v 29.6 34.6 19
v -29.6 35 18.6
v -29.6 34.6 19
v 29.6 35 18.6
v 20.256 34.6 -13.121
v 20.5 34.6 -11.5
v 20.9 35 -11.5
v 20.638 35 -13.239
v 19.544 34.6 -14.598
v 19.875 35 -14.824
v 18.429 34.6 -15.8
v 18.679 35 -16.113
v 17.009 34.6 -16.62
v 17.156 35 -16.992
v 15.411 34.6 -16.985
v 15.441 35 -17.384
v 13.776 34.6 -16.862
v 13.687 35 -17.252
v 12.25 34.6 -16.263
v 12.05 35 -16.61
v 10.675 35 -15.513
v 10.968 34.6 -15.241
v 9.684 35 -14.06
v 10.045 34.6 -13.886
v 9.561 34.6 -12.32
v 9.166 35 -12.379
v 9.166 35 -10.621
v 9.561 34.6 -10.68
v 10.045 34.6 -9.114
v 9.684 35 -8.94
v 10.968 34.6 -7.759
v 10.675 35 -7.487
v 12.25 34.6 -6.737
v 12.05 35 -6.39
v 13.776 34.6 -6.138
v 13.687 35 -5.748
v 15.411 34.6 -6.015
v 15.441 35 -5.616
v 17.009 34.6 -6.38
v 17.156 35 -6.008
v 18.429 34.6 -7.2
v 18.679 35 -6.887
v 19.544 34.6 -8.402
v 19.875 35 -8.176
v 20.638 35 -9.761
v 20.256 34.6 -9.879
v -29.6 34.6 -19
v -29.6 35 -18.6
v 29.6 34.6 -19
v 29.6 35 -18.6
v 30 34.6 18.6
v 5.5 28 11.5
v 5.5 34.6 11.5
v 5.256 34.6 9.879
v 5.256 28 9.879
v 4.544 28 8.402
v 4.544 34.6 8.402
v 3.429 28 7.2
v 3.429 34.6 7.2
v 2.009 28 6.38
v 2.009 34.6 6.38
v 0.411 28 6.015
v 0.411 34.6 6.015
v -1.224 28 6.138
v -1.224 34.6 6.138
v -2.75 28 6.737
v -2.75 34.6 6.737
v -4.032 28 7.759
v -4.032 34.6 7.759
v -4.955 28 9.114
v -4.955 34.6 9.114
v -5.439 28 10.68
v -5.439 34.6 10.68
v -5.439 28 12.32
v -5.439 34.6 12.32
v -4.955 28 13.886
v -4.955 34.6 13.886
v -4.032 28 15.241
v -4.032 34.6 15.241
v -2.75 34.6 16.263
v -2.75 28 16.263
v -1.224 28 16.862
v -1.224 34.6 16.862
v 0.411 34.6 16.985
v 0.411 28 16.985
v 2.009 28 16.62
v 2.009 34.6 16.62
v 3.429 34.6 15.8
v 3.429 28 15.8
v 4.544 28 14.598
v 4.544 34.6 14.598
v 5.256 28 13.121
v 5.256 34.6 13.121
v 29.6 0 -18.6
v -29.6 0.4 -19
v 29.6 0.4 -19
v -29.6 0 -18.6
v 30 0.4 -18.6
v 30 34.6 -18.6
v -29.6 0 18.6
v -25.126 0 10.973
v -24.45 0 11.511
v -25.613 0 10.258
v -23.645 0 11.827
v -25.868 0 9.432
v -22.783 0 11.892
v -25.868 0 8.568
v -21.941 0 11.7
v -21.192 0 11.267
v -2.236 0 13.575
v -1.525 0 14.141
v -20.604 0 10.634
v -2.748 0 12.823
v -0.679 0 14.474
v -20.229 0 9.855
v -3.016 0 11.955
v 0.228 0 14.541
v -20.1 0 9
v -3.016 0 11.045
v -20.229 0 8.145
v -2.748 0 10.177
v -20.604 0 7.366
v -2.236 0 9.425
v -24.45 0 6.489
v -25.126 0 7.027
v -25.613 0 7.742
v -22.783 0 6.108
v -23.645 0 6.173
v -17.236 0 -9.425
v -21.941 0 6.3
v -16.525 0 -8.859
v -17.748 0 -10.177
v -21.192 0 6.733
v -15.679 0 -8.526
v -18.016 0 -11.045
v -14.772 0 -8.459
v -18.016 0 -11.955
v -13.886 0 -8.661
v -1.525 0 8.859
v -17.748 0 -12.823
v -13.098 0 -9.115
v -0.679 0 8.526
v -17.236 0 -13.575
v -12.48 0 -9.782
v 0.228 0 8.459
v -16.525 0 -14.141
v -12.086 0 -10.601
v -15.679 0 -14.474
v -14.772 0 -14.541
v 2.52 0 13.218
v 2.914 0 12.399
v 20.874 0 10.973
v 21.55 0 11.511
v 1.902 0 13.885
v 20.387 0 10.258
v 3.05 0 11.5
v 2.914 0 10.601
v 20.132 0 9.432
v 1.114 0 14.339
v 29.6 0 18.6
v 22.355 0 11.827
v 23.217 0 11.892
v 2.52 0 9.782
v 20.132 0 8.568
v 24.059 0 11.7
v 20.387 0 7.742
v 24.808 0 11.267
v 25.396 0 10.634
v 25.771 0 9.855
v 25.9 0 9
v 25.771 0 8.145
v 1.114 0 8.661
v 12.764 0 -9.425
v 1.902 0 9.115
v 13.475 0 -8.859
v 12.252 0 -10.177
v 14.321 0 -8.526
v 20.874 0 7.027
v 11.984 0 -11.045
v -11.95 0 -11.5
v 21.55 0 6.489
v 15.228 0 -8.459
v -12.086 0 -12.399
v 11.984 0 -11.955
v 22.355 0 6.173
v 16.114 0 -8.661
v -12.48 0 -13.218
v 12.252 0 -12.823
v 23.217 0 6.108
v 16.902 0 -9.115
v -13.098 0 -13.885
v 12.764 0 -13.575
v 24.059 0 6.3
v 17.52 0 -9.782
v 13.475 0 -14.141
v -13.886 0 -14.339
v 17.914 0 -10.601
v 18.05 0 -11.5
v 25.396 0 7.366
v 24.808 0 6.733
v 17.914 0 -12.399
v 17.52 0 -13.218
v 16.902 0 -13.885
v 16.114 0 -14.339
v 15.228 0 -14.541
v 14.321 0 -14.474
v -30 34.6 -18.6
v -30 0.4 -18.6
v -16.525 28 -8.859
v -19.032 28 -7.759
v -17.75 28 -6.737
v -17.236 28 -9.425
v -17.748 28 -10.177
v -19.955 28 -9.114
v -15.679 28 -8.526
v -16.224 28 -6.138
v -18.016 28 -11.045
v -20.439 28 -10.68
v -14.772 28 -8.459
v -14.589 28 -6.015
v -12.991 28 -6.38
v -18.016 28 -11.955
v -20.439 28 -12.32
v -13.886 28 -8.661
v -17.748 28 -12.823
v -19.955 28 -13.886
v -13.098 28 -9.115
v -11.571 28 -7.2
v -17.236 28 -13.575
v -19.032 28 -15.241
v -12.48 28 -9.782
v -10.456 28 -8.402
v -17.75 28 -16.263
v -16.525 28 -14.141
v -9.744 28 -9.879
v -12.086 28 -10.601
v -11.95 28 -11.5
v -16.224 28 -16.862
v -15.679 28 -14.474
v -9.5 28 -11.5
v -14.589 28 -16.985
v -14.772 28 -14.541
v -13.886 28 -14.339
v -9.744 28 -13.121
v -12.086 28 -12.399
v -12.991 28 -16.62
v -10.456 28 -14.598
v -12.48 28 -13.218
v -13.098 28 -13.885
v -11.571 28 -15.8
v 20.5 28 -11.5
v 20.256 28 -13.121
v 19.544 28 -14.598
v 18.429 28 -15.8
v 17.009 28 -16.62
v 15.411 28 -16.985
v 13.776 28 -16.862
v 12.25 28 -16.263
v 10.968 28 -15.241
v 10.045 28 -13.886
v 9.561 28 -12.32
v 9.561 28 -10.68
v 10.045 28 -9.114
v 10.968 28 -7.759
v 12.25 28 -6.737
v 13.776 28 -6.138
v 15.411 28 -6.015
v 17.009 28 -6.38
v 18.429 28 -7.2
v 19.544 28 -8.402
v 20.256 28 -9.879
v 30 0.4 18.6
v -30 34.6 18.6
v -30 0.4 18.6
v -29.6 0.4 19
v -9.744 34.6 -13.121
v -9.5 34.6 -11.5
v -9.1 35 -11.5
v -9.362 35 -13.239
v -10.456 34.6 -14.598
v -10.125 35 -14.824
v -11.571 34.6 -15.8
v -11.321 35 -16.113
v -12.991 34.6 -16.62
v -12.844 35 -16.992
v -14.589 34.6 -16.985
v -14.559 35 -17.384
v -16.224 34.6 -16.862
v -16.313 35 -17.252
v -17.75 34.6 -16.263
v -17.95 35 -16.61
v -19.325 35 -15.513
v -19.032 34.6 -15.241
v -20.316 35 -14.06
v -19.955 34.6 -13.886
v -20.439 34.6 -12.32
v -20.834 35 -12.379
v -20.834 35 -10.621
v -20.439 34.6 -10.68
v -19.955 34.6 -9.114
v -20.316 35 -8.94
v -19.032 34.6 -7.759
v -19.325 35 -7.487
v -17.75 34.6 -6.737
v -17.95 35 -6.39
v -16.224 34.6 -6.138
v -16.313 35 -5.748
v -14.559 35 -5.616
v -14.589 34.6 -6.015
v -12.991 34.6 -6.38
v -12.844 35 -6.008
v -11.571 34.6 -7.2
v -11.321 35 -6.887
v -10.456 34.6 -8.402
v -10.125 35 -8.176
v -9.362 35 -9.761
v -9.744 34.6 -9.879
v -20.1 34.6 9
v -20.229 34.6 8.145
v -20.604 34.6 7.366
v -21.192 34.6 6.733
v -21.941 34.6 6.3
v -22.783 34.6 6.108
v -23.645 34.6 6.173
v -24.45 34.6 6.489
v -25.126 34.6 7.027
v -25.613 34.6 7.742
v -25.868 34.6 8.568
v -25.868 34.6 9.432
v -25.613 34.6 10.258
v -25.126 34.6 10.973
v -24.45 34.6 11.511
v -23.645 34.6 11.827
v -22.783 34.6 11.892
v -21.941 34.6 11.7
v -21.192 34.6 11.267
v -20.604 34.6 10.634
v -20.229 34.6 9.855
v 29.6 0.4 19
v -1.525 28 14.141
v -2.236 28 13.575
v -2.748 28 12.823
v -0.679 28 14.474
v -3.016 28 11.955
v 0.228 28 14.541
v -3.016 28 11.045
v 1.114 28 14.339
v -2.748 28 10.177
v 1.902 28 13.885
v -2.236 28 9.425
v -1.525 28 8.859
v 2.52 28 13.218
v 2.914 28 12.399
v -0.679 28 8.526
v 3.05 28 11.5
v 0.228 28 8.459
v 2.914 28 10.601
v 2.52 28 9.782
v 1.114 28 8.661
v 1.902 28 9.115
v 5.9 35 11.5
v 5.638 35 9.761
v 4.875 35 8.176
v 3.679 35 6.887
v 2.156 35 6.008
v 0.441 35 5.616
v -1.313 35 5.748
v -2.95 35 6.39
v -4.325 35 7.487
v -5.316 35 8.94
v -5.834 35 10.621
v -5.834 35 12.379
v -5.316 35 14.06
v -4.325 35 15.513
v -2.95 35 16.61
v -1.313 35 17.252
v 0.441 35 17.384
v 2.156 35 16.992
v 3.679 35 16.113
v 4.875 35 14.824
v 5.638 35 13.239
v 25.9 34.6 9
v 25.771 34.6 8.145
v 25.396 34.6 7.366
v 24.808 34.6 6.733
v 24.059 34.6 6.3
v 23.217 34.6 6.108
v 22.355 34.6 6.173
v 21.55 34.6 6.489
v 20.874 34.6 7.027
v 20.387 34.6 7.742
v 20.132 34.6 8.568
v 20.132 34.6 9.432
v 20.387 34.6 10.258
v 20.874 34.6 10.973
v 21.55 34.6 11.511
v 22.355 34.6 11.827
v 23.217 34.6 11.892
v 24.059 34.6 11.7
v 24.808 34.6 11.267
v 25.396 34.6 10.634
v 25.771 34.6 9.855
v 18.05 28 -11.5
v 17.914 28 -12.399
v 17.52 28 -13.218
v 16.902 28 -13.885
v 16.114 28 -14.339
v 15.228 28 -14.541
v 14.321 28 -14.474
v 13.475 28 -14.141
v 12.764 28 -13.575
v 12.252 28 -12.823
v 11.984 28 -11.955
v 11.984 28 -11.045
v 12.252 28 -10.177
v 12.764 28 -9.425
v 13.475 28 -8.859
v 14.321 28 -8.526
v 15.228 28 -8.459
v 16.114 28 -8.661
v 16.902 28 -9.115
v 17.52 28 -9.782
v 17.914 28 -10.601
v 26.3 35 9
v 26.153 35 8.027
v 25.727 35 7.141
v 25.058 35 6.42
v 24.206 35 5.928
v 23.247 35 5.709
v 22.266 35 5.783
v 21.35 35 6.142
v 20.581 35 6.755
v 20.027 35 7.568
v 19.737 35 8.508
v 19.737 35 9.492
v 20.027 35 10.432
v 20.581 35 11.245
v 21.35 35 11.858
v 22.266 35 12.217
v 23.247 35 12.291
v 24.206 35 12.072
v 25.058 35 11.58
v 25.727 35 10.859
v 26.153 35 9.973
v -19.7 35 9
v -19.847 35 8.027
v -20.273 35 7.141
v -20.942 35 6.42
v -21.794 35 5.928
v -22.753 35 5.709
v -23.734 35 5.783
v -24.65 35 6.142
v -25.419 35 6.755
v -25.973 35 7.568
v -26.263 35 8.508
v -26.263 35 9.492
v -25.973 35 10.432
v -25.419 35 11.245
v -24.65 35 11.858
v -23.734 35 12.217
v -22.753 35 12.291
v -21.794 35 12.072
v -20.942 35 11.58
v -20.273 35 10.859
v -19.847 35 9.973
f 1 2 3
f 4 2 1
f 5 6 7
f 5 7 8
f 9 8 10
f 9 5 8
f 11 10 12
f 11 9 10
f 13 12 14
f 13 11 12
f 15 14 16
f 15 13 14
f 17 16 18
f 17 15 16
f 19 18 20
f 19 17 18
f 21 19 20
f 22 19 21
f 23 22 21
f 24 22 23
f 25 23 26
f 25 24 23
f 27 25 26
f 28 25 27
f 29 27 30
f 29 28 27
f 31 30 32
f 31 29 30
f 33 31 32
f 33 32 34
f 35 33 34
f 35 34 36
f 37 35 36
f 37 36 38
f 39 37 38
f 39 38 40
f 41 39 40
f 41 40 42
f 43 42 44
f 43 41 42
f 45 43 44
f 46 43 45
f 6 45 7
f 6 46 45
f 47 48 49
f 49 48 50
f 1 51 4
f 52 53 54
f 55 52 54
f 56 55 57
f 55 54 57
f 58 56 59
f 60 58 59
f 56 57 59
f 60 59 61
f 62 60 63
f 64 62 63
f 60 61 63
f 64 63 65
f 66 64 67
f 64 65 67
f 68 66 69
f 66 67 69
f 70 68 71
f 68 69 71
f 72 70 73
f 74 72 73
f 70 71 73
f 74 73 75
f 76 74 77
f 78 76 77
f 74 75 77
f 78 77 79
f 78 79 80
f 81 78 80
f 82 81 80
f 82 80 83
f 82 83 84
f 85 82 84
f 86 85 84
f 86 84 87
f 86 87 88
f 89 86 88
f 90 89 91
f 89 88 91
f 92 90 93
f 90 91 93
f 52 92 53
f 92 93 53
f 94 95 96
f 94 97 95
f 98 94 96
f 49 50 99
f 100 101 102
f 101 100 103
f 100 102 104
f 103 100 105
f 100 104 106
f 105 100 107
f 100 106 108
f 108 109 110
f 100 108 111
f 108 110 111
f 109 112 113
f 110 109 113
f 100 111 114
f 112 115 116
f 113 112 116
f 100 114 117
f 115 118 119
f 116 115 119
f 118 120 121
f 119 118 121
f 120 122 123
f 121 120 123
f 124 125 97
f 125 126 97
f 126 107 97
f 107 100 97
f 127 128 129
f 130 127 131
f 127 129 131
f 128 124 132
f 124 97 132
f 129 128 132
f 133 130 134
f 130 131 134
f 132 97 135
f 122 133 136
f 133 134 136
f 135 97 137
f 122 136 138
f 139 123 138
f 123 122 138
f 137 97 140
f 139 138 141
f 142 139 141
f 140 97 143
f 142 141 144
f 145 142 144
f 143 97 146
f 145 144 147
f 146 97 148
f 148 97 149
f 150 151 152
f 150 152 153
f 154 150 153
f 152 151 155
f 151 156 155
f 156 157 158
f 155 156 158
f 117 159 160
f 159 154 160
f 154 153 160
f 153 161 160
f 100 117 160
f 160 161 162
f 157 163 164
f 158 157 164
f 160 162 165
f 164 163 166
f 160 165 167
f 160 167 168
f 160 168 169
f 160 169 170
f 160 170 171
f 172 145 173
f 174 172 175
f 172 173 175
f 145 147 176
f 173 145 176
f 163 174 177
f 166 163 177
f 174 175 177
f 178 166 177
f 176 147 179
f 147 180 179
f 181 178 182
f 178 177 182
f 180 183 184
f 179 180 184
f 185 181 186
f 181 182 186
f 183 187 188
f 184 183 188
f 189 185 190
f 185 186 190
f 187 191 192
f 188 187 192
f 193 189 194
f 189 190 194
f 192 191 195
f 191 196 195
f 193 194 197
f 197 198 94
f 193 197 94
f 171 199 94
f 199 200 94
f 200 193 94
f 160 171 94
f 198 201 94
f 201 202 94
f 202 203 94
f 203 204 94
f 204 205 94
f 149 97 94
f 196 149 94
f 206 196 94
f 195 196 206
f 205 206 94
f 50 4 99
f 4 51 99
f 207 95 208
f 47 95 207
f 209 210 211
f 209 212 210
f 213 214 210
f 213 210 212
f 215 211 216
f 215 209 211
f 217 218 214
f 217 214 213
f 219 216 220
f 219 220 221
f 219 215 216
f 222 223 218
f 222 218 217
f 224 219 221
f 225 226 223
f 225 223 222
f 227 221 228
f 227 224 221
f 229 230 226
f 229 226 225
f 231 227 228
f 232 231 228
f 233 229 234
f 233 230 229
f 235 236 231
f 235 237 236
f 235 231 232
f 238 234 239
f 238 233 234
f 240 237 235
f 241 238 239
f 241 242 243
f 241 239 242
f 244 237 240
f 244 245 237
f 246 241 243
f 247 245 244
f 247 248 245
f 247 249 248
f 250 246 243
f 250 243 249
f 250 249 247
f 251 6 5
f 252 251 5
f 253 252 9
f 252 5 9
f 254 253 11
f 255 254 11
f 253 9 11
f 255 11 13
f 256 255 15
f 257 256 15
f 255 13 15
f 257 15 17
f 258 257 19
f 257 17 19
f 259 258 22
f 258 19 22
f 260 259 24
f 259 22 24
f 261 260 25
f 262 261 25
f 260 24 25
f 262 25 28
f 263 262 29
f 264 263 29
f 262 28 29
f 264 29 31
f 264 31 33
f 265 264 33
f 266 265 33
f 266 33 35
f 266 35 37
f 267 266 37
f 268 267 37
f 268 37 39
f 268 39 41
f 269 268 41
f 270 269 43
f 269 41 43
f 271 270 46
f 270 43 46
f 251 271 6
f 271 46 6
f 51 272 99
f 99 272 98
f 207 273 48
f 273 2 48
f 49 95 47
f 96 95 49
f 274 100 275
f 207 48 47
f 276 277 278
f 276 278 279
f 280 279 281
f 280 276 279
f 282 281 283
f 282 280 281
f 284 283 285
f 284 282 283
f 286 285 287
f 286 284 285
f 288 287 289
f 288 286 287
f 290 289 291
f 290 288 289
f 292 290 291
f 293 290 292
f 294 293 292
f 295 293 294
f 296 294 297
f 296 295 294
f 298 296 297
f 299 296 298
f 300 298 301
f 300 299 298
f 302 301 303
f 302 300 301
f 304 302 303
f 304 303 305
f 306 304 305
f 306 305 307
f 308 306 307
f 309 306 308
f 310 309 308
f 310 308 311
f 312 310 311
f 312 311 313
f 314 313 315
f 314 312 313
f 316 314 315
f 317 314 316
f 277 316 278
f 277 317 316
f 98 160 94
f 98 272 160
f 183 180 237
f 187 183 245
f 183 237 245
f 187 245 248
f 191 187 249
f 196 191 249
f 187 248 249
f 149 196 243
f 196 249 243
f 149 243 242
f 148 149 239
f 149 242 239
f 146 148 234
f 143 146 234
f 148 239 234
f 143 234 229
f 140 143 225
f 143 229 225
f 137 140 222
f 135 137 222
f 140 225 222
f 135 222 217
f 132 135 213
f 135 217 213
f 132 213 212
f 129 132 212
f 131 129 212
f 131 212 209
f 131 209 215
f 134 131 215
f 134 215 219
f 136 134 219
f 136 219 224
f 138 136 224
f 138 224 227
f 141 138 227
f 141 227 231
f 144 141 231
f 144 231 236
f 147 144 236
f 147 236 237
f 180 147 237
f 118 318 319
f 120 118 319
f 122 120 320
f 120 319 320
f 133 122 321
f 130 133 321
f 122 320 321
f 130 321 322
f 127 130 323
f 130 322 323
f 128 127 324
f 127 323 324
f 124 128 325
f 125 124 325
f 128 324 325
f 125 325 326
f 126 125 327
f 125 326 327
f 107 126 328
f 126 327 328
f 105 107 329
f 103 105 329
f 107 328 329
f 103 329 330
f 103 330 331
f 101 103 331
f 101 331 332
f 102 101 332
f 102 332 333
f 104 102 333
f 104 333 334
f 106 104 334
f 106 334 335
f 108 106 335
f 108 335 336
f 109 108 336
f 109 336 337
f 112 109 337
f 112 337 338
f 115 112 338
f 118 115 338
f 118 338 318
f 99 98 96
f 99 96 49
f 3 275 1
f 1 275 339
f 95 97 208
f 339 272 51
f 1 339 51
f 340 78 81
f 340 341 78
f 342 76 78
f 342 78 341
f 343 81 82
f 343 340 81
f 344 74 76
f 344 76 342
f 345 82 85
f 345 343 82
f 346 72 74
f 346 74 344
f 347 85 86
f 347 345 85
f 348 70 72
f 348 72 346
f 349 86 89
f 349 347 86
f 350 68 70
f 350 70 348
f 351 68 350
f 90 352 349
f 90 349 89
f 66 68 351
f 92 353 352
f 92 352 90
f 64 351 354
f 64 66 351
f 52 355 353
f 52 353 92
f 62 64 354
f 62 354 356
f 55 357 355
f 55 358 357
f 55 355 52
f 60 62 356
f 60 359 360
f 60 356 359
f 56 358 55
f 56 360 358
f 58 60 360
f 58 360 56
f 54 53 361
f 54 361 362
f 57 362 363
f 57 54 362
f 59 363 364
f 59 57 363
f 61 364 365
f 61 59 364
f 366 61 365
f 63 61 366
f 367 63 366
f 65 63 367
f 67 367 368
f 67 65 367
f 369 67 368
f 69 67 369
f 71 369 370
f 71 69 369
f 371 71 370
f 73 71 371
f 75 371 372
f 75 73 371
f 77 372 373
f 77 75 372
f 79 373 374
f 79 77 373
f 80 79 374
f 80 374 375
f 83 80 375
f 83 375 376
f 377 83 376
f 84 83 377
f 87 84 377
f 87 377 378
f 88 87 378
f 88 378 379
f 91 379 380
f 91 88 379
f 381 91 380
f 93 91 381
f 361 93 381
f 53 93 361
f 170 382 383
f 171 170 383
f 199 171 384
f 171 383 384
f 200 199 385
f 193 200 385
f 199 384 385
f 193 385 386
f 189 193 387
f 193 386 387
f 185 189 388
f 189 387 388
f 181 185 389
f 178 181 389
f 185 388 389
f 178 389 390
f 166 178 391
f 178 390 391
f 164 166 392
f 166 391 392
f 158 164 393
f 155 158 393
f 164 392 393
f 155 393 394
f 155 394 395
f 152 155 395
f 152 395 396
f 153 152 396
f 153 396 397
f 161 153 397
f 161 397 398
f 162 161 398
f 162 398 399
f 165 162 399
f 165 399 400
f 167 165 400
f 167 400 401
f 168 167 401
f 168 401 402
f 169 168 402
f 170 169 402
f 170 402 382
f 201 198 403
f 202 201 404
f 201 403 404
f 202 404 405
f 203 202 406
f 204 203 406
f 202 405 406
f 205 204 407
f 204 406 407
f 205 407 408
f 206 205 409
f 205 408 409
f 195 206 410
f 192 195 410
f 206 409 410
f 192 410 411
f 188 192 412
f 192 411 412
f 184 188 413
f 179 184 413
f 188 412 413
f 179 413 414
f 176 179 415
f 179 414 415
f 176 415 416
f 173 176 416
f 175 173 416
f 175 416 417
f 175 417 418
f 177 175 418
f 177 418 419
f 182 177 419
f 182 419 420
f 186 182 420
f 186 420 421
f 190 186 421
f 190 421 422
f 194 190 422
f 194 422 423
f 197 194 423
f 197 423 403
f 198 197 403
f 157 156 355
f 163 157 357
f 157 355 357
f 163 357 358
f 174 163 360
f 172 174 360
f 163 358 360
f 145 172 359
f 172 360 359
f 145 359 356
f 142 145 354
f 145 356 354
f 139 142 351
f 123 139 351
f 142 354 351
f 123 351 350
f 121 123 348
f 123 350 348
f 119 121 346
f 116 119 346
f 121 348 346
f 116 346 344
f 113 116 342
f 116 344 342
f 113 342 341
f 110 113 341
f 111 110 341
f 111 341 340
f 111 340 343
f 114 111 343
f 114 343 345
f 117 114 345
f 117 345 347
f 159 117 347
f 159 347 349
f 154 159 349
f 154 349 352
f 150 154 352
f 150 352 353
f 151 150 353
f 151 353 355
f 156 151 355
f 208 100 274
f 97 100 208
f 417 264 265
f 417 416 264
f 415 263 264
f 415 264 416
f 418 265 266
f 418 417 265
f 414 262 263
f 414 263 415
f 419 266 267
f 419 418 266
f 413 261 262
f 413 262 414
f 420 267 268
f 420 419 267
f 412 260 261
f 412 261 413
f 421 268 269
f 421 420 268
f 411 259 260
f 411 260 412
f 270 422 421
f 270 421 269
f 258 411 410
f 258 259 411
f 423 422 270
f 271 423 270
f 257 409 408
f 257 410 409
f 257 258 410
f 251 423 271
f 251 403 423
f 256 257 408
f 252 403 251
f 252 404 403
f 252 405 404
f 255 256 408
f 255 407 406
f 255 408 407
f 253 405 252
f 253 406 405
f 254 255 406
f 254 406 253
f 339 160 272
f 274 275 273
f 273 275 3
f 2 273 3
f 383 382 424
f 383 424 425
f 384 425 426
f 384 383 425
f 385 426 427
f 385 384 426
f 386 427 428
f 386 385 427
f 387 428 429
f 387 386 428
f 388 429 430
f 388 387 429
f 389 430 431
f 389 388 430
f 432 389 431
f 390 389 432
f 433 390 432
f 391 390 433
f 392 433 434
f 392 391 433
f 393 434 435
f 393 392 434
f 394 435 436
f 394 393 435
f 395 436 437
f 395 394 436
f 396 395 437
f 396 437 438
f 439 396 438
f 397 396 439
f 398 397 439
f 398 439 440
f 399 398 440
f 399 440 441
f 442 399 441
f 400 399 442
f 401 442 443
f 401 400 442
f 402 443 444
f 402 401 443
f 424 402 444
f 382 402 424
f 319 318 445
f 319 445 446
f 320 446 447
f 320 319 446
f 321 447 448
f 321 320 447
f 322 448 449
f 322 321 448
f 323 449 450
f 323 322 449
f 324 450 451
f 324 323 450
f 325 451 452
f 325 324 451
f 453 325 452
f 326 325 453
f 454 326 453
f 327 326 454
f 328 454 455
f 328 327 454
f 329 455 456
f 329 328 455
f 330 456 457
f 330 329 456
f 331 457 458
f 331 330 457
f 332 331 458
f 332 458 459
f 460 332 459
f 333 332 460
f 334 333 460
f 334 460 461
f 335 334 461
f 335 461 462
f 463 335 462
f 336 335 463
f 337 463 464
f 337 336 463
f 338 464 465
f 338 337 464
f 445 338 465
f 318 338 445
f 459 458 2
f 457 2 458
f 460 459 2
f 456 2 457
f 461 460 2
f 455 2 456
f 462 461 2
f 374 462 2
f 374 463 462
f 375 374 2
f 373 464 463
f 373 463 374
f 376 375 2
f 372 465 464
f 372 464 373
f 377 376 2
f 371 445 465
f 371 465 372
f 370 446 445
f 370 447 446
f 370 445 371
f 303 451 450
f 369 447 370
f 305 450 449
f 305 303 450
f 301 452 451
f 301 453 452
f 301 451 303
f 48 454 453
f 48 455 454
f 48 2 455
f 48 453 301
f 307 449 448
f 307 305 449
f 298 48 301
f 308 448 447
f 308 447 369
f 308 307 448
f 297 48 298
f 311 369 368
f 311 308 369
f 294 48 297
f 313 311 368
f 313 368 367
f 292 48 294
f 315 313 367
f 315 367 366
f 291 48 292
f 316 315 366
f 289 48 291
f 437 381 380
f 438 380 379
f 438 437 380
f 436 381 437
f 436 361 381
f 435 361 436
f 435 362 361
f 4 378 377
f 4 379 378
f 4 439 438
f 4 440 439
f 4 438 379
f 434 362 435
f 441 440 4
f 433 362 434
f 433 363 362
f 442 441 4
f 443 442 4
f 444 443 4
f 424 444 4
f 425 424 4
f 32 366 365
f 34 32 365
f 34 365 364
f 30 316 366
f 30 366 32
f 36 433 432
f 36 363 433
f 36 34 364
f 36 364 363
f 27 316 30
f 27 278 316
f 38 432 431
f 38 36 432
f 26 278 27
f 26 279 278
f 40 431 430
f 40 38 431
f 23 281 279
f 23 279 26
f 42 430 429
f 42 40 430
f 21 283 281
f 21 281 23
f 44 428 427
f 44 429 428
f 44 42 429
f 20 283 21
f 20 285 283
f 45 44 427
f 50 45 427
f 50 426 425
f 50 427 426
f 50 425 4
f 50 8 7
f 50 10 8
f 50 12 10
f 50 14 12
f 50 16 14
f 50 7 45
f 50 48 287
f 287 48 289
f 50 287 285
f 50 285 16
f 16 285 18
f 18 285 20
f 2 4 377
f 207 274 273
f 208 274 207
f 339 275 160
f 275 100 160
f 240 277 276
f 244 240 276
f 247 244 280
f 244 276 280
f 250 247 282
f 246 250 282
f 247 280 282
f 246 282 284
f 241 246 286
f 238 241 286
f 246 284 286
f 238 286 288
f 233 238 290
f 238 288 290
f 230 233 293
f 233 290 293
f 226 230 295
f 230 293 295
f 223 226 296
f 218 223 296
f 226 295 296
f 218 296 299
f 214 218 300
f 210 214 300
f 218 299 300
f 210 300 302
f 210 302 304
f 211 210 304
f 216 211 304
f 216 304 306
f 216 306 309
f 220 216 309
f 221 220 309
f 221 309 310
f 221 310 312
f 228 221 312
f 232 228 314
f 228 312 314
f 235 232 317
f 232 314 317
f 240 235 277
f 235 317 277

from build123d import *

# Parameters (mm, degrees)
SKETCH1_W           = 60
SKETCH1_H           = 38
BOSS_EXTRUDE1_DEPTH = 35
SKETCH2_R           = 2.9
SKETCH2_R_2         = 3.05
CUT_EXTRUDE1_DEPTH  = 36
SKETCH3_R           = 5.5
CUT_EXTRUDE2_DEPTH  = 7
CHAMFER1_SIZE       = 0.4


with BuildPart() as part:
    # Sketch1 → Boss-Extrude1 (new body)
    with BuildSketch(Plane(origin=(0, 0, 0), x_dir=(1, 0, 0), z_dir=(0, 1, 0))):
        Rectangle(SKETCH1_W, SKETCH1_H)
    extrude(amount=BOSS_EXTRUDE1_DEPTH)

    # Sketch2 → Cut-Extrude1 (cut, through all)
    with BuildSketch(Plane(origin=(0, 35, 0), x_dir=(1, 0, 0), z_dir=(0, 1, 0))):
        with Locations((-23, -9)):
            Circle(SKETCH2_R)
        with Locations((23, -9)):
            Circle(SKETCH2_R)
        with Locations((-15, 11.5)):
            Circle(SKETCH2_R_2)
        with Locations((0, -11.5)):
            Circle(SKETCH2_R_2)
        with Locations((15, 11.5)):
            Circle(SKETCH2_R_2)
    extrude(amount=-CUT_EXTRUDE1_DEPTH, mode=Mode.SUBTRACT)

    # Sketch3 → Cut-Extrude2 (cut)
    with BuildSketch(Plane(origin=(0, 35, 0), x_dir=(1, 0, 0), z_dir=(0, 1, 0))):
        with Locations((-15, 11.5)):
            Circle(SKETCH3_R)
        with Locations((15, 11.5)):
            Circle(SKETCH3_R)
        with Locations((0, -11.5)):
            Circle(SKETCH3_R)
    extrude(amount=-CUT_EXTRUDE2_DEPTH, mode=Mode.SUBTRACT)

    # Chamfer1
    chamfer1_edges = [part.edges().sort_by_distance(p)[0] for p in [
        (30, 35, 0),
        (0, 35, -19),
        (-25.9, 35, 9),
        (20.1, 35, 9),
        (-20.5, 35, -11.5),
        (9.5, 35, -11.5),
        (-5.5, 35, 11.5),
        (-30, 35, 0),
        (0, 0, -19),
        (30, 0, 0),
        (0, 0, 19),
        (-30, 0, 0),
        (-30, 17.5, -19),
        (30, 17.5, -19),
        (30, 17.5, 19),
        (-30, 17.5, 19),
        (0, 35, 19),
    ]]
    chamfer(chamfer1_edges, length=CHAMFER1_SIZE)


solid = part.part
